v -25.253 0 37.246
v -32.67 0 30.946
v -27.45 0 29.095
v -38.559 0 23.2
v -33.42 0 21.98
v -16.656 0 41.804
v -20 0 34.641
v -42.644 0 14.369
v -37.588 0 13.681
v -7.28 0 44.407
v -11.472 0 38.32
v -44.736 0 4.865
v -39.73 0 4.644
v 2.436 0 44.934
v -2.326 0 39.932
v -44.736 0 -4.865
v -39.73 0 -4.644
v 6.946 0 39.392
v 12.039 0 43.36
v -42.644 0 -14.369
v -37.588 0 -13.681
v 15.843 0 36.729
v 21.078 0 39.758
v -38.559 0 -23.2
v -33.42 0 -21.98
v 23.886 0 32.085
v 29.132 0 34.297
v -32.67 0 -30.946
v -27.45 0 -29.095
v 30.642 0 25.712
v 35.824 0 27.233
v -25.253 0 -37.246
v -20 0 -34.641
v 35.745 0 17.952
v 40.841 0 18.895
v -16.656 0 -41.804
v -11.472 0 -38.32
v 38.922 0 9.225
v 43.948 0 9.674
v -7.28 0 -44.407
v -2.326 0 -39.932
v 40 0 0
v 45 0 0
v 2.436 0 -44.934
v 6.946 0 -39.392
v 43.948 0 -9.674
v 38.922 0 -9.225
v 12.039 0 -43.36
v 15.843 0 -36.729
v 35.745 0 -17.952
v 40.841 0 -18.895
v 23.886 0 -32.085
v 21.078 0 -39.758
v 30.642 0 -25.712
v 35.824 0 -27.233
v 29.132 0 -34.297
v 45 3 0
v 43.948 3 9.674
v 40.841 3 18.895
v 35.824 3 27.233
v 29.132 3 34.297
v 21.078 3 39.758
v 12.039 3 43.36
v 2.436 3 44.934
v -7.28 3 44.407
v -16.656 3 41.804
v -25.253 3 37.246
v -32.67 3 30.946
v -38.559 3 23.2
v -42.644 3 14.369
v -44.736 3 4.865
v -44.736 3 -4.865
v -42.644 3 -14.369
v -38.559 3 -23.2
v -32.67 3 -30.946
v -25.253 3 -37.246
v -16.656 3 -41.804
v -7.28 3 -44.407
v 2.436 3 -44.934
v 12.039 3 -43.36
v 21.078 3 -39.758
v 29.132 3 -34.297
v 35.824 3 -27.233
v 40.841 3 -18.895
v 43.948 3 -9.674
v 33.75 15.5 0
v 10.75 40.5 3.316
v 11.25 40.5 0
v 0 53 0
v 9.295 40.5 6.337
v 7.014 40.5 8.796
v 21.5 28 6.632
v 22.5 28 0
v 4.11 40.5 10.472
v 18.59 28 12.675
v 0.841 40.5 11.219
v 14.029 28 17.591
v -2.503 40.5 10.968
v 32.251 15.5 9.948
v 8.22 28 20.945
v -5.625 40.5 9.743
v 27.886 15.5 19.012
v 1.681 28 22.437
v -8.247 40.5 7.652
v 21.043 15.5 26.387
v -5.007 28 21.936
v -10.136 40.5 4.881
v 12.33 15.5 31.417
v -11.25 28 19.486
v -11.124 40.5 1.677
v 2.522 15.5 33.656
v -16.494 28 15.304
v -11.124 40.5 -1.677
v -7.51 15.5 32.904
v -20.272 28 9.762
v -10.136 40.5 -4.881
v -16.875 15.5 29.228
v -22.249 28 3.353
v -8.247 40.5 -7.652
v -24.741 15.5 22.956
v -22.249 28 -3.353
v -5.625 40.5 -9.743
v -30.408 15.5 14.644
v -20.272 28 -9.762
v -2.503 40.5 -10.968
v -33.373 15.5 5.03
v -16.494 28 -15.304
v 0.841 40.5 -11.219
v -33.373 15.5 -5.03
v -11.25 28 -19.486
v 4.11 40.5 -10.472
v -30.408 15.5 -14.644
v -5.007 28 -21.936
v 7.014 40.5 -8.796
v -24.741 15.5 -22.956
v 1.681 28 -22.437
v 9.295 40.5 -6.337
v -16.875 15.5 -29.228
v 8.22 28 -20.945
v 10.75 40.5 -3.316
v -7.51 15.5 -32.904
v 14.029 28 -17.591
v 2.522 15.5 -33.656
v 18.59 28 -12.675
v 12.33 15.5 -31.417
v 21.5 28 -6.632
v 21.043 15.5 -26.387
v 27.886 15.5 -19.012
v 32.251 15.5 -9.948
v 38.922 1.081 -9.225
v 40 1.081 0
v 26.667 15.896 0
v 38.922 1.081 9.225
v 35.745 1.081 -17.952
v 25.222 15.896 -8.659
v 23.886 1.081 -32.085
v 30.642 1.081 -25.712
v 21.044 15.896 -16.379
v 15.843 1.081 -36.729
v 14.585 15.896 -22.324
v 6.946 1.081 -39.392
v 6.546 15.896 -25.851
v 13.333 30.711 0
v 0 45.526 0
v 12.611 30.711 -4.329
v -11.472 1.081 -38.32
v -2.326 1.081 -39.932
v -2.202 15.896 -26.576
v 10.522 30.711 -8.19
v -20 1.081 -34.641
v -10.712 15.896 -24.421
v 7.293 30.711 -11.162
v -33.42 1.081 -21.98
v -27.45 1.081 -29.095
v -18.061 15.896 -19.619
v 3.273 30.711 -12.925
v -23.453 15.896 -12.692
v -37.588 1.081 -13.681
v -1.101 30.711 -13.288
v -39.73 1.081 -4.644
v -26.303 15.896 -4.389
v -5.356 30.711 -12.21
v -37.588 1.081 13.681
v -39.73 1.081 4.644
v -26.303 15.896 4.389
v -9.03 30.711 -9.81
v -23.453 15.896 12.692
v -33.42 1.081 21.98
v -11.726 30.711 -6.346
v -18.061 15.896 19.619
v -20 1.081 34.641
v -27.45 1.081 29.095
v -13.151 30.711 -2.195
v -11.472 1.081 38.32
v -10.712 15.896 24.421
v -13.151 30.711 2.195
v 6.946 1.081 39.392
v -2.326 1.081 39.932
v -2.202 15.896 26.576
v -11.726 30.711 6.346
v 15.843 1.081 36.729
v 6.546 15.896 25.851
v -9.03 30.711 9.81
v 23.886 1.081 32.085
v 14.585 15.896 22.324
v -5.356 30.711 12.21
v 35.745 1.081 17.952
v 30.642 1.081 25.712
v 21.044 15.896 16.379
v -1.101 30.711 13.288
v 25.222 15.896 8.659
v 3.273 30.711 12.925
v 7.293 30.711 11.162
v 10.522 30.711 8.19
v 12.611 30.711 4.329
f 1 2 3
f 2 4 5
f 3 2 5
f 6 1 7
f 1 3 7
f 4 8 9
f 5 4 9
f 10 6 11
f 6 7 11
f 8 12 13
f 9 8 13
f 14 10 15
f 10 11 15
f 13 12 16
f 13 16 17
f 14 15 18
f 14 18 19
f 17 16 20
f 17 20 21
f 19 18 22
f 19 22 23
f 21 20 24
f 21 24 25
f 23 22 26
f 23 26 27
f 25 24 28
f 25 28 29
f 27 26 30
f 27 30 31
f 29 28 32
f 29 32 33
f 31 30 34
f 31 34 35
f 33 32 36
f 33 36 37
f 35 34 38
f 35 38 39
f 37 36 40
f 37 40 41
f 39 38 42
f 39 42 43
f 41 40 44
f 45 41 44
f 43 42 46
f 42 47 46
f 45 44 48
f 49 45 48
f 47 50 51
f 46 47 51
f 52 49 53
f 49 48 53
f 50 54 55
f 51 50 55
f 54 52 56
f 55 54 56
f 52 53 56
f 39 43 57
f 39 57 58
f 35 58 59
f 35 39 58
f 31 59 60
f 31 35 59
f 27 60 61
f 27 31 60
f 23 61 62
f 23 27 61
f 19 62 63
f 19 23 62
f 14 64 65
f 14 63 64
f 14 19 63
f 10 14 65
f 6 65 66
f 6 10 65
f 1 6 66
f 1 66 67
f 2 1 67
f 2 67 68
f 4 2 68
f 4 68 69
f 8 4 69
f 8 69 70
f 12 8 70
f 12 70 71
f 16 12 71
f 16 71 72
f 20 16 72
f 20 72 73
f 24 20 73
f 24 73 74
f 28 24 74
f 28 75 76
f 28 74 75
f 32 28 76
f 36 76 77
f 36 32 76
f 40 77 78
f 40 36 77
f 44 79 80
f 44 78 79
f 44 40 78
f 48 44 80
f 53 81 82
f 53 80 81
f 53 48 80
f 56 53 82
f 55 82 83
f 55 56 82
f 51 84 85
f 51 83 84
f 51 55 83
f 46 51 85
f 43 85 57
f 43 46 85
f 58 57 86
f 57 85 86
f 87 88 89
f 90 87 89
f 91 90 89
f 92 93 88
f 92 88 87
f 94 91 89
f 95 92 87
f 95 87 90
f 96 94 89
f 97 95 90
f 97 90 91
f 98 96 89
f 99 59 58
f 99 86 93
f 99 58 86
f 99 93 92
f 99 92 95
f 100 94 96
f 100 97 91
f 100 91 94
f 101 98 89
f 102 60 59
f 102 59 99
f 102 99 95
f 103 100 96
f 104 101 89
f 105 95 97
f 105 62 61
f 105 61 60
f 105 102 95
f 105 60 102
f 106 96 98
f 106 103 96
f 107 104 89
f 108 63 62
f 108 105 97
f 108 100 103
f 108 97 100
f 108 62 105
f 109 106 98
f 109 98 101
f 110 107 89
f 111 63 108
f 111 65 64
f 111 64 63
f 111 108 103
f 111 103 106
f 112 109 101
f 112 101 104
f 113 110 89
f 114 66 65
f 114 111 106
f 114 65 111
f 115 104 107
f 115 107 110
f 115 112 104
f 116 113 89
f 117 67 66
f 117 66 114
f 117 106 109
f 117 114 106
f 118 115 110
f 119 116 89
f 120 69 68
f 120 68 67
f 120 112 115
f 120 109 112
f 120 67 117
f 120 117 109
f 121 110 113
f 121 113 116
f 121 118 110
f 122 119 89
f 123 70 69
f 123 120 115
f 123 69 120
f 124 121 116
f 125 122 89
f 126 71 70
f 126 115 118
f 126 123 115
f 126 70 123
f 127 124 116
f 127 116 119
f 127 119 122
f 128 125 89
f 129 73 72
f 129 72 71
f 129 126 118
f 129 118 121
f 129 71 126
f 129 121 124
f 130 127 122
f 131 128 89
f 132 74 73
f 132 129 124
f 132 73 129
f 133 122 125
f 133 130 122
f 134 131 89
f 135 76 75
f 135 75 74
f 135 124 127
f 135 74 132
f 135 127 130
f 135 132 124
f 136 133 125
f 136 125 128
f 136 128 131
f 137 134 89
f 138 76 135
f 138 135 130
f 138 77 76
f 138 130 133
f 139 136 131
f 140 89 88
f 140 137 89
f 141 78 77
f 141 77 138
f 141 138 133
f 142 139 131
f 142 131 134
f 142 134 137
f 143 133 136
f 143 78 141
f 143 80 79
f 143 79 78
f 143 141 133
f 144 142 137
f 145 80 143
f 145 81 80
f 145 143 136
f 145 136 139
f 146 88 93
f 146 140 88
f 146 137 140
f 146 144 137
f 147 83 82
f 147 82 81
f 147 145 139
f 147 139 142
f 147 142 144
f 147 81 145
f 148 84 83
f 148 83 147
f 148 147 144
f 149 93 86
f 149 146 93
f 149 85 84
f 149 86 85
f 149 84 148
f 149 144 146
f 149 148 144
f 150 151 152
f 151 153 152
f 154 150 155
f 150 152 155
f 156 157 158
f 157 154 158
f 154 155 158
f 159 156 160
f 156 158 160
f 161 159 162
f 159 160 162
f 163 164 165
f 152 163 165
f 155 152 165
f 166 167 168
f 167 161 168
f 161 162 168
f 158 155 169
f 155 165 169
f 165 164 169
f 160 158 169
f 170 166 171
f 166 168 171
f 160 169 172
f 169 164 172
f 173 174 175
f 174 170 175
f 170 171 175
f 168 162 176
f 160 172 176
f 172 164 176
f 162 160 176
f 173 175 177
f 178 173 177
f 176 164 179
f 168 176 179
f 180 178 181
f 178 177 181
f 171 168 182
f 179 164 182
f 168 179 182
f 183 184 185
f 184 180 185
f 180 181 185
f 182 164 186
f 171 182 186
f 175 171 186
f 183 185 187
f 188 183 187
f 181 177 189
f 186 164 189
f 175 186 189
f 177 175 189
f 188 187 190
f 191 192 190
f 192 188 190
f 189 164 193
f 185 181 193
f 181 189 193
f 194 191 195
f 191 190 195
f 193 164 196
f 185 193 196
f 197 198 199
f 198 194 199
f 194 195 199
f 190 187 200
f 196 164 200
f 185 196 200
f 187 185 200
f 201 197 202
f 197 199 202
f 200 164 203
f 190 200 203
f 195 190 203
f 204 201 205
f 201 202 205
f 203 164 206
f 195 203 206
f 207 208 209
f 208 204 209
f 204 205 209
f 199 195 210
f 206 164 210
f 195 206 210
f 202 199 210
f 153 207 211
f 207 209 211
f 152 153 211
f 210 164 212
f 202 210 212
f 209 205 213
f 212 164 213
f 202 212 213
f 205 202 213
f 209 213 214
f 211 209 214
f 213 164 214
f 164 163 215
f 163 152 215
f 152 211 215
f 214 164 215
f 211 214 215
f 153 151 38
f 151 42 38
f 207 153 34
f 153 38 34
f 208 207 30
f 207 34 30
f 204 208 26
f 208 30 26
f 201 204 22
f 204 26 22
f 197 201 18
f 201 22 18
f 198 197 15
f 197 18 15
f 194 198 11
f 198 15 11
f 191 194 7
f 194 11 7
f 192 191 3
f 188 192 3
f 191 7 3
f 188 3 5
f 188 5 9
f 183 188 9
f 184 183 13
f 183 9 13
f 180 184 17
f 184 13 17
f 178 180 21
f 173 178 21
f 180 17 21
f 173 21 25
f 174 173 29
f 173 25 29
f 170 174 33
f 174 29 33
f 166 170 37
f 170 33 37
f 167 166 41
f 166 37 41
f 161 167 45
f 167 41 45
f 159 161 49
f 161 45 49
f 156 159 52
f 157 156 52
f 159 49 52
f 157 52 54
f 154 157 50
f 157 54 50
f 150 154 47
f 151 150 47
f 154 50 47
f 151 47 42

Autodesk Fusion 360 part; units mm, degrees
sketch "Sketch1" plane through (0, 0, 0) normal (0, 1, 0) x (1, 0, 0)
  circle A0 centre (0, 0) radius 45
  dimension "d1" = 90
extrude "Extrude1" add sketch "Sketch1" along normal blind 100 makes body 1
sketch "Sketch2" plane through (0, 100, 0) normal (0, 1, 0) x (-1, 0, 0)
  circle A0 centre (0, 0) radius 45
  circle A1 centre (0, 0) radius 42.5
  dimension "d4" = 85
extrude "Extrude2" cut sketch "Sketch2" against normal blind 110 contours A1 bodies 1
sketch "Sketch3" plane through (0, 0, 0) normal (0, 0, 1) x (1, 0, 0)
extrude "Extrude3" add sketch "Sketch1" along normal blind 3 separate body makes body 2
sketch "Sketch4" plane through (0, 0, 0) normal (0, 0, 1) x (1, 0, 0)
  line L0 (0, 3) -> (0, 53)
  line L1 (0, 53) -> (45, 3)
  line L2 (45, 3) -> (0, 3)
  dimension "d9" = 50
revolve "Revolve1" add sketch "Sketch4" angle 360 about axis through (0, 3, 0) along (0, 1, 0) bodies 2
shell "Shell1" thickness 5 removed faces 1 at (4.1569, 0, 25.5535) on bodies 2
hidden bodies 1
